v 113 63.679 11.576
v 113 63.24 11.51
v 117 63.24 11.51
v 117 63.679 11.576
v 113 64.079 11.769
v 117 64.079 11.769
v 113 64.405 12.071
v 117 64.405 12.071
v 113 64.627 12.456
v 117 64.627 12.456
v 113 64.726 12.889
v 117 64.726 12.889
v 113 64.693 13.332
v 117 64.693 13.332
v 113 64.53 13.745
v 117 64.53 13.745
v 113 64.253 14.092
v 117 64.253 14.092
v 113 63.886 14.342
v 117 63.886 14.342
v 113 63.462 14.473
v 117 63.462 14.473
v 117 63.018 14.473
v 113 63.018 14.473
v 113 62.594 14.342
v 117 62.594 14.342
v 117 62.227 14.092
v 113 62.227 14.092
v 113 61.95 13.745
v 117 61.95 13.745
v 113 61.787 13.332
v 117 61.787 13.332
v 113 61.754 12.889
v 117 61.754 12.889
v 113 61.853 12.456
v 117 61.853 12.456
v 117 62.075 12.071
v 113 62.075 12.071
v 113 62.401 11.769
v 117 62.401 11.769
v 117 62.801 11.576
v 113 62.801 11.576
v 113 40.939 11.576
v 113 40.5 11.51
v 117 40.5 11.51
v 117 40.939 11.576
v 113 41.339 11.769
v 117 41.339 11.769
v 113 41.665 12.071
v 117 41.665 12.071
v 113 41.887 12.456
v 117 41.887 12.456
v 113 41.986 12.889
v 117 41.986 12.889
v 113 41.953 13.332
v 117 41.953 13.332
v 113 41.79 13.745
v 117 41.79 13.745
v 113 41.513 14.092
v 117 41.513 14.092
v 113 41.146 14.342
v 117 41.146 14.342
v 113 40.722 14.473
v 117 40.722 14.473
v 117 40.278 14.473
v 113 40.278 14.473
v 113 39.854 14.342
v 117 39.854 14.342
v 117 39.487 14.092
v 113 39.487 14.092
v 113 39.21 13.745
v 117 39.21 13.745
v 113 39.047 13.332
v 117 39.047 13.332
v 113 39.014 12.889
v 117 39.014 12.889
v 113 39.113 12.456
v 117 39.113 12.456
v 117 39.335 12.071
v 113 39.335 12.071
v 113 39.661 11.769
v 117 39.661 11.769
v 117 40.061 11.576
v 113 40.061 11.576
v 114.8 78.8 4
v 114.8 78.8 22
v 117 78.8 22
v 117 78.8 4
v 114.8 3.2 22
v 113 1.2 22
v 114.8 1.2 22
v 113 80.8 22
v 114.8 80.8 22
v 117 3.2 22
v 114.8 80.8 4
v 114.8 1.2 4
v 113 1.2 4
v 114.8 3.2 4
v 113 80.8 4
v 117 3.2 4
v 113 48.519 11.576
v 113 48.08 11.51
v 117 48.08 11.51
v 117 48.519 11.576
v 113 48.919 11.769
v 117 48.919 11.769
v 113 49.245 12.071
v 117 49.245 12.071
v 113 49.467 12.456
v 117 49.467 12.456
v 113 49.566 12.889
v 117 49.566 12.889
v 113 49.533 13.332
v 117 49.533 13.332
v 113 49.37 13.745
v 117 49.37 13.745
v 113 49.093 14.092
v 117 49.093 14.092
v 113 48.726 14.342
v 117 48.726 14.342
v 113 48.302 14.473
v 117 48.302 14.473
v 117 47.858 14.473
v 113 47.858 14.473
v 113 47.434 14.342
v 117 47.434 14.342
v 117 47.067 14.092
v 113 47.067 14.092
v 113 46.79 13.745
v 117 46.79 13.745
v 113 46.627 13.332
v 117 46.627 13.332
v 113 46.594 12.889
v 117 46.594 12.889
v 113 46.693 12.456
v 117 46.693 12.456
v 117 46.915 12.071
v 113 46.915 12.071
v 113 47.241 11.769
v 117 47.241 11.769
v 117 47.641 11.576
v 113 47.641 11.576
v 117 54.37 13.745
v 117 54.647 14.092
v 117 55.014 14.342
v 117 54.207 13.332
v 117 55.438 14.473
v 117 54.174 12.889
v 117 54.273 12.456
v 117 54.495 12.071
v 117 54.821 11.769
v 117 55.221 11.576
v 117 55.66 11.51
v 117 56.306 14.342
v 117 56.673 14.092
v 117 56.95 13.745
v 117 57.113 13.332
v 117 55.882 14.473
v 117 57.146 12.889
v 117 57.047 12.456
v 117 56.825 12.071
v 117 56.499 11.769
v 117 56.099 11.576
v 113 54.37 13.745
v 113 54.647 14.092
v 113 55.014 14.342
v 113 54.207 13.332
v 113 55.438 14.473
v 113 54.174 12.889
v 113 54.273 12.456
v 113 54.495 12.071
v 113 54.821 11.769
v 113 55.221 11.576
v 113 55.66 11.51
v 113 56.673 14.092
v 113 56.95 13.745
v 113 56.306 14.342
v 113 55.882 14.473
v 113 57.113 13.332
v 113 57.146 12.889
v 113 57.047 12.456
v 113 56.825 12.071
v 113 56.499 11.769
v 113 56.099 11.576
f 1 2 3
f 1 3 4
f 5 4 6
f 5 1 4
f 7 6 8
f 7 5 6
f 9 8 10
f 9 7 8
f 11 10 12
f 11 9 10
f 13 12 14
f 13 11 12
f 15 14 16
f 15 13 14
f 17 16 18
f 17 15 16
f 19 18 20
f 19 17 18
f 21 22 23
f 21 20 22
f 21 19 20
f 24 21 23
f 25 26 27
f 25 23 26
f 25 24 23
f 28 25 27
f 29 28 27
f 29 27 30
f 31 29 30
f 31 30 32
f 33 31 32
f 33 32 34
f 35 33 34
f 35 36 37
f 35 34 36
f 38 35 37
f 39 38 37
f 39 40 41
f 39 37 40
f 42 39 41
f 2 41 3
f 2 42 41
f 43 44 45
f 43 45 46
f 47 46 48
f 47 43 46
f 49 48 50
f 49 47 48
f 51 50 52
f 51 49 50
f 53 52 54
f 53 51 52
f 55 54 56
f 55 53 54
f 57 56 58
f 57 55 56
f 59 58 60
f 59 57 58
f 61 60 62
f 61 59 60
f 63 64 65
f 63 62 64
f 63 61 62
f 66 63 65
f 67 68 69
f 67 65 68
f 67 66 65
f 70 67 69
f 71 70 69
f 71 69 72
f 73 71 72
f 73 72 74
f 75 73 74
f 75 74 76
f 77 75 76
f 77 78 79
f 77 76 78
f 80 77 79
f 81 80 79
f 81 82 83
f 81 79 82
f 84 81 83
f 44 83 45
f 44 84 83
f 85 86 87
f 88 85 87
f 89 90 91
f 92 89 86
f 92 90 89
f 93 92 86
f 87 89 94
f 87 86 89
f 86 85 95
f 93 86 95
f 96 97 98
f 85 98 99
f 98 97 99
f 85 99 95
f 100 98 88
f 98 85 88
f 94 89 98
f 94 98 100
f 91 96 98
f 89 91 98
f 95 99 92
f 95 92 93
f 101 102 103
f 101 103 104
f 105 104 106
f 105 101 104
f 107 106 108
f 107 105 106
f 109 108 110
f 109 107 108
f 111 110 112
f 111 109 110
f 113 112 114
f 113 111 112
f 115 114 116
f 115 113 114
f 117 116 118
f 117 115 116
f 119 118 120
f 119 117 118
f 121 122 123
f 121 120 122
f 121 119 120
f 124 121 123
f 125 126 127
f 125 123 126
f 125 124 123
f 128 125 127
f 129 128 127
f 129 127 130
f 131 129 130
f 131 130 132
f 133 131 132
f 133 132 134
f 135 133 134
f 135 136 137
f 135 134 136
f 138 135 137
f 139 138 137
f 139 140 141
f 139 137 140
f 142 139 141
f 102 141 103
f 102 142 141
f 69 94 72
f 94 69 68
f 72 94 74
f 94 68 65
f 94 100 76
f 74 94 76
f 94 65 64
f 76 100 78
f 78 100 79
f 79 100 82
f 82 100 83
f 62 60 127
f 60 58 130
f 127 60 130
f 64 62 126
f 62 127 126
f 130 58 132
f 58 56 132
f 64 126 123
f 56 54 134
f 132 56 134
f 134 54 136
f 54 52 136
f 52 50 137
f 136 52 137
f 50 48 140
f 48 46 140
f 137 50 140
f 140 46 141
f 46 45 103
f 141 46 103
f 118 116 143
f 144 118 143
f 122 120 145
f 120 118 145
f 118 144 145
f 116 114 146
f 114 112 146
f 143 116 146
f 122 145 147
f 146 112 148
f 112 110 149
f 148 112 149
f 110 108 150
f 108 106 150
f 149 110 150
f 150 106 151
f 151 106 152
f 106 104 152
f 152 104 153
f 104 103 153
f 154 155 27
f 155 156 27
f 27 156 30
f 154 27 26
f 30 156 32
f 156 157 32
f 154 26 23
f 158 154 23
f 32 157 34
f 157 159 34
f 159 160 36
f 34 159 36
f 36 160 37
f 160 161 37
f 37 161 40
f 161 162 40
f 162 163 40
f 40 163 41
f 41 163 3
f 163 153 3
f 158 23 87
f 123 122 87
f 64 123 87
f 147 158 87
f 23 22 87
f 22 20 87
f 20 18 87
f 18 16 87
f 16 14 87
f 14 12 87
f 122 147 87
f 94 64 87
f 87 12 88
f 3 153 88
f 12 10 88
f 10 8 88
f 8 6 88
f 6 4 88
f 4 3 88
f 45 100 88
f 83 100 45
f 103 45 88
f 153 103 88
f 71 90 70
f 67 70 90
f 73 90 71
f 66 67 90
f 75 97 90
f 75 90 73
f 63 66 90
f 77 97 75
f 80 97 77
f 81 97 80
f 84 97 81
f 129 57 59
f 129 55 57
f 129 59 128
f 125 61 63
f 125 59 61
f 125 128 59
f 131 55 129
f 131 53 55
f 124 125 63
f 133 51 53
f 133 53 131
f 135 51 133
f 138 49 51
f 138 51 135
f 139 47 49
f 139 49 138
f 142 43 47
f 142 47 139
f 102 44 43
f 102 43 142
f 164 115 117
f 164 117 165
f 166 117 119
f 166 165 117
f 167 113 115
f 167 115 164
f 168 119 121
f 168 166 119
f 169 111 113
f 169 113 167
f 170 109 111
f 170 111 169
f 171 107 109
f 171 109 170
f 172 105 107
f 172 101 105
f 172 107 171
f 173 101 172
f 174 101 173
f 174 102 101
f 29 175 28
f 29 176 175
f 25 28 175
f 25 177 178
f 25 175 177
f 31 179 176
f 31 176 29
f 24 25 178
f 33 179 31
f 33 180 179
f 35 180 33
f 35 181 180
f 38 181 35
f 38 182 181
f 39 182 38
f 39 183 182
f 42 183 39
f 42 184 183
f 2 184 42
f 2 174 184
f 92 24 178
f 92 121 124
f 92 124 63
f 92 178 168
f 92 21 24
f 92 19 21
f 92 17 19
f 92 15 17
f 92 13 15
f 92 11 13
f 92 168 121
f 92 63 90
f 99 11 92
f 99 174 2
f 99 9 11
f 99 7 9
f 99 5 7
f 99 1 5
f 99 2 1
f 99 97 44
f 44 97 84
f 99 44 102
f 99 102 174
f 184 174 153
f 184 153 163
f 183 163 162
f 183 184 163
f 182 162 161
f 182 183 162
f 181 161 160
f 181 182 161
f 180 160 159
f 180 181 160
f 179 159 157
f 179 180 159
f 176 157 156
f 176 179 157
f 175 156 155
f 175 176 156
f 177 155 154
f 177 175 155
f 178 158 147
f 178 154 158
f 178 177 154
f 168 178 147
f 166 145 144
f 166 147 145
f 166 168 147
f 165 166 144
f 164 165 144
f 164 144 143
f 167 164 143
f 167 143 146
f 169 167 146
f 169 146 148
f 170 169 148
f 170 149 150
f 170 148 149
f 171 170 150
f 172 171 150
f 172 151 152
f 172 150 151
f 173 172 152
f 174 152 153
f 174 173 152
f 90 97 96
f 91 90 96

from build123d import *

# Parameters (mm, degrees)
CYLINDER010_R     = 1.49
CYLINDER010_DEPTH = 10
ARRAY016_Y_COUNT  = 4
ARRAY016_Y_PITCH  = 7.58
BOX051_W          = 10
BOX051_H          = 10
BOX051_DEPTH      = 31
BOX050_W          = 10
BOX050_H          = 10
BOX050_DEPTH      = 30
BOX049_W          = 10
BOX049_H          = 10
BOX049_DEPTH      = 25
BOX048_W          = 10
BOX048_H          = 10
BOX048_DEPTH      = 25
BOX046_W          = 2
BOX046_H          = 80
BOX046_DEPTH      = 18
BOX047_W          = 4
BOX047_H          = 76
BOX047_DEPTH      = 18


with BuildPart() as array016:
    # Cylinder010 → Cylinder010 (new body)
    with BuildSketch(Plane(origin=(143, 6, 13), x_dir=(0, 0, -1), z_dir=(1, 0, 0))):
        Circle(CYLINDER010_R)
    extrude(amount=CYLINDER010_DEPTH)

    # Array016 Y: Array016 ×4


with BuildPart() as array016_1:
    add(array016.part)
    with Locations(*[(0, i * ARRAY016_Y_PITCH, 0) for i in range(1, ARRAY016_Y_COUNT)]):
        add(array016.part)


with BuildPart() as array016_2:
    # Array016 placement: moved
    add(array016_1.part.moved(Location((-33, 34.5, 0))))


with BuildPart() as w_rfel037:
    # Box051 → Box051 (new body)
    with BuildSketch(Plane(origin=(110, 80.8, 0), x_dir=(1, 0, 0), z_dir=(0, 0, 1))):
        with Locations((5, 5)):
            Rectangle(BOX051_W, BOX051_H)
    extrude(amount=BOX051_DEPTH)


with BuildPart() as w_rfel036:
    # Box050 → Box050 (new body)
    with BuildSketch(Plane(origin=(109, -8.8, 0), x_dir=(1, 0, 0), z_dir=(0, 0, 1))):
        with Locations((5, 5)):
            Rectangle(BOX050_W, BOX050_H)
    extrude(amount=BOX050_DEPTH)


with BuildPart() as w_rfel035:
    # Box049 → Box049 (new body)
    with BuildSketch(Plane(origin=(114.8, 78.8, 0), x_dir=(1, 0, 0), z_dir=(0, 0, 1))):
        with Locations((5, 5)):
            Rectangle(BOX049_W, BOX049_H)
    extrude(amount=BOX049_DEPTH)


with BuildPart() as w_rfel034:
    # Box048 → Box048 (new body)
    with BuildSketch(Plane(origin=(114.8, -6.8, 0), x_dir=(1, 0, 0), z_dir=(0, 0, 1))):
        with Locations((5, 5)):
            Rectangle(BOX048_W, BOX048_H)
    extrude(amount=BOX048_DEPTH)


with BuildPart() as f_hrung003:
    # Box046 → Box046 (new body)
    with BuildSketch(Plane(origin=(113, 1, 23), x_dir=(1, 0, 0), z_dir=(0, 0, 1))):
        with Locations((1, 40)):
            Rectangle(BOX046_W, BOX046_H)
    extrude(amount=BOX046_DEPTH)


with BuildPart() as cut052:
    # Box047 → Box047 (new body)
    with BuildSketch(Plane(origin=(113, 3, 23), x_dir=(1, 0, 0), z_dir=(0, 0, 1))):
        with Locations((2, 38)):
            Rectangle(BOX047_W, BOX047_H)
    extrude(amount=BOX047_DEPTH)

    # Fusion008031: union Führung003
    add(f_hrung003.part)


with BuildPart() as cut052_1:
    # Fusion008031 placement: moved
    add(cut052.part.moved(Location((0, 0, -19))))

    # Cut047: cut Würfel034
    add(w_rfel034.part, mode=Mode.SUBTRACT)

    # Cut048: cut Würfel035
    add(w_rfel035.part, mode=Mode.SUBTRACT)

    # Cut049: cut Würfel036
    add(w_rfel036.part, mode=Mode.SUBTRACT)

    # Cut050: cut Würfel037
    add(w_rfel037.part, mode=Mode.SUBTRACT)

    # Cut052: cut Array016
    add(array016_2.part, mode=Mode.SUBTRACT)


solid = cut052_1.part
